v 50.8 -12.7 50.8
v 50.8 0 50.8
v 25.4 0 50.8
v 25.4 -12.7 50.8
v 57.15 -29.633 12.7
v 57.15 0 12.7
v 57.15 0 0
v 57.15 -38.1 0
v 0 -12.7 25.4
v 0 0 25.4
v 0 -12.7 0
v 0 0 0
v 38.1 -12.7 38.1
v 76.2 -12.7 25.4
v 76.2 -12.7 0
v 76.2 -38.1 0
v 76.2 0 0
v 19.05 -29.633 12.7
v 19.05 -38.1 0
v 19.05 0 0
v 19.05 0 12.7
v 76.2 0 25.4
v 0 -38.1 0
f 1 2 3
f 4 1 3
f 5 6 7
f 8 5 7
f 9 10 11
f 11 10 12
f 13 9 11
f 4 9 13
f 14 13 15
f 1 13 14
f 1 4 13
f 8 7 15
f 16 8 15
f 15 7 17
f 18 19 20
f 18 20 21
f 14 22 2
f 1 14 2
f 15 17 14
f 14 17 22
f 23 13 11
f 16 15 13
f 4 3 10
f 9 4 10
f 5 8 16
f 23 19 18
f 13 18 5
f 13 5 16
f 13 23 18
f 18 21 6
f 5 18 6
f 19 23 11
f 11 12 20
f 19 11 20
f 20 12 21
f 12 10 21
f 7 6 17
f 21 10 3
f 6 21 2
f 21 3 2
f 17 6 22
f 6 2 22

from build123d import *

# Parameters (mm, degrees)
F1_DEPTH = 12.7
F2_DEPTH = 38.1
F4_DEPTH = 76.2


with BuildPart() as f1:
    # F0 (on Front) → F1 (new body)
    with BuildSketch(Plane.XZ):
        Polygon((0, 25.4), (0, 0), (38.1, 38.1), (76.2, 0), (76.2, 25.4), (50.8, 50.8), (25.4, 50.8), align=None)
    extrude(amount=F1_DEPTH)

    # F0 (on Front) → F2 (join)
    with BuildSketch(Plane.XZ):
        Polygon((38.1, 38.1), (0, 0), (19.05, 0), (19.05, 12.7), (57.15, 12.7), (57.15, 0), (76.2, 0), align=None)
    extrude(amount=F2_DEPTH)

    # F3 (on Right) → F4 (cut)
    with BuildSketch(Plane.YZ):
        Polygon((-12.7, 38.1), (-38.1, 38.1), (-38.1, 0), align=None)
    extrude(amount=F4_DEPTH, mode=Mode.SUBTRACT)


solid = f1.part
